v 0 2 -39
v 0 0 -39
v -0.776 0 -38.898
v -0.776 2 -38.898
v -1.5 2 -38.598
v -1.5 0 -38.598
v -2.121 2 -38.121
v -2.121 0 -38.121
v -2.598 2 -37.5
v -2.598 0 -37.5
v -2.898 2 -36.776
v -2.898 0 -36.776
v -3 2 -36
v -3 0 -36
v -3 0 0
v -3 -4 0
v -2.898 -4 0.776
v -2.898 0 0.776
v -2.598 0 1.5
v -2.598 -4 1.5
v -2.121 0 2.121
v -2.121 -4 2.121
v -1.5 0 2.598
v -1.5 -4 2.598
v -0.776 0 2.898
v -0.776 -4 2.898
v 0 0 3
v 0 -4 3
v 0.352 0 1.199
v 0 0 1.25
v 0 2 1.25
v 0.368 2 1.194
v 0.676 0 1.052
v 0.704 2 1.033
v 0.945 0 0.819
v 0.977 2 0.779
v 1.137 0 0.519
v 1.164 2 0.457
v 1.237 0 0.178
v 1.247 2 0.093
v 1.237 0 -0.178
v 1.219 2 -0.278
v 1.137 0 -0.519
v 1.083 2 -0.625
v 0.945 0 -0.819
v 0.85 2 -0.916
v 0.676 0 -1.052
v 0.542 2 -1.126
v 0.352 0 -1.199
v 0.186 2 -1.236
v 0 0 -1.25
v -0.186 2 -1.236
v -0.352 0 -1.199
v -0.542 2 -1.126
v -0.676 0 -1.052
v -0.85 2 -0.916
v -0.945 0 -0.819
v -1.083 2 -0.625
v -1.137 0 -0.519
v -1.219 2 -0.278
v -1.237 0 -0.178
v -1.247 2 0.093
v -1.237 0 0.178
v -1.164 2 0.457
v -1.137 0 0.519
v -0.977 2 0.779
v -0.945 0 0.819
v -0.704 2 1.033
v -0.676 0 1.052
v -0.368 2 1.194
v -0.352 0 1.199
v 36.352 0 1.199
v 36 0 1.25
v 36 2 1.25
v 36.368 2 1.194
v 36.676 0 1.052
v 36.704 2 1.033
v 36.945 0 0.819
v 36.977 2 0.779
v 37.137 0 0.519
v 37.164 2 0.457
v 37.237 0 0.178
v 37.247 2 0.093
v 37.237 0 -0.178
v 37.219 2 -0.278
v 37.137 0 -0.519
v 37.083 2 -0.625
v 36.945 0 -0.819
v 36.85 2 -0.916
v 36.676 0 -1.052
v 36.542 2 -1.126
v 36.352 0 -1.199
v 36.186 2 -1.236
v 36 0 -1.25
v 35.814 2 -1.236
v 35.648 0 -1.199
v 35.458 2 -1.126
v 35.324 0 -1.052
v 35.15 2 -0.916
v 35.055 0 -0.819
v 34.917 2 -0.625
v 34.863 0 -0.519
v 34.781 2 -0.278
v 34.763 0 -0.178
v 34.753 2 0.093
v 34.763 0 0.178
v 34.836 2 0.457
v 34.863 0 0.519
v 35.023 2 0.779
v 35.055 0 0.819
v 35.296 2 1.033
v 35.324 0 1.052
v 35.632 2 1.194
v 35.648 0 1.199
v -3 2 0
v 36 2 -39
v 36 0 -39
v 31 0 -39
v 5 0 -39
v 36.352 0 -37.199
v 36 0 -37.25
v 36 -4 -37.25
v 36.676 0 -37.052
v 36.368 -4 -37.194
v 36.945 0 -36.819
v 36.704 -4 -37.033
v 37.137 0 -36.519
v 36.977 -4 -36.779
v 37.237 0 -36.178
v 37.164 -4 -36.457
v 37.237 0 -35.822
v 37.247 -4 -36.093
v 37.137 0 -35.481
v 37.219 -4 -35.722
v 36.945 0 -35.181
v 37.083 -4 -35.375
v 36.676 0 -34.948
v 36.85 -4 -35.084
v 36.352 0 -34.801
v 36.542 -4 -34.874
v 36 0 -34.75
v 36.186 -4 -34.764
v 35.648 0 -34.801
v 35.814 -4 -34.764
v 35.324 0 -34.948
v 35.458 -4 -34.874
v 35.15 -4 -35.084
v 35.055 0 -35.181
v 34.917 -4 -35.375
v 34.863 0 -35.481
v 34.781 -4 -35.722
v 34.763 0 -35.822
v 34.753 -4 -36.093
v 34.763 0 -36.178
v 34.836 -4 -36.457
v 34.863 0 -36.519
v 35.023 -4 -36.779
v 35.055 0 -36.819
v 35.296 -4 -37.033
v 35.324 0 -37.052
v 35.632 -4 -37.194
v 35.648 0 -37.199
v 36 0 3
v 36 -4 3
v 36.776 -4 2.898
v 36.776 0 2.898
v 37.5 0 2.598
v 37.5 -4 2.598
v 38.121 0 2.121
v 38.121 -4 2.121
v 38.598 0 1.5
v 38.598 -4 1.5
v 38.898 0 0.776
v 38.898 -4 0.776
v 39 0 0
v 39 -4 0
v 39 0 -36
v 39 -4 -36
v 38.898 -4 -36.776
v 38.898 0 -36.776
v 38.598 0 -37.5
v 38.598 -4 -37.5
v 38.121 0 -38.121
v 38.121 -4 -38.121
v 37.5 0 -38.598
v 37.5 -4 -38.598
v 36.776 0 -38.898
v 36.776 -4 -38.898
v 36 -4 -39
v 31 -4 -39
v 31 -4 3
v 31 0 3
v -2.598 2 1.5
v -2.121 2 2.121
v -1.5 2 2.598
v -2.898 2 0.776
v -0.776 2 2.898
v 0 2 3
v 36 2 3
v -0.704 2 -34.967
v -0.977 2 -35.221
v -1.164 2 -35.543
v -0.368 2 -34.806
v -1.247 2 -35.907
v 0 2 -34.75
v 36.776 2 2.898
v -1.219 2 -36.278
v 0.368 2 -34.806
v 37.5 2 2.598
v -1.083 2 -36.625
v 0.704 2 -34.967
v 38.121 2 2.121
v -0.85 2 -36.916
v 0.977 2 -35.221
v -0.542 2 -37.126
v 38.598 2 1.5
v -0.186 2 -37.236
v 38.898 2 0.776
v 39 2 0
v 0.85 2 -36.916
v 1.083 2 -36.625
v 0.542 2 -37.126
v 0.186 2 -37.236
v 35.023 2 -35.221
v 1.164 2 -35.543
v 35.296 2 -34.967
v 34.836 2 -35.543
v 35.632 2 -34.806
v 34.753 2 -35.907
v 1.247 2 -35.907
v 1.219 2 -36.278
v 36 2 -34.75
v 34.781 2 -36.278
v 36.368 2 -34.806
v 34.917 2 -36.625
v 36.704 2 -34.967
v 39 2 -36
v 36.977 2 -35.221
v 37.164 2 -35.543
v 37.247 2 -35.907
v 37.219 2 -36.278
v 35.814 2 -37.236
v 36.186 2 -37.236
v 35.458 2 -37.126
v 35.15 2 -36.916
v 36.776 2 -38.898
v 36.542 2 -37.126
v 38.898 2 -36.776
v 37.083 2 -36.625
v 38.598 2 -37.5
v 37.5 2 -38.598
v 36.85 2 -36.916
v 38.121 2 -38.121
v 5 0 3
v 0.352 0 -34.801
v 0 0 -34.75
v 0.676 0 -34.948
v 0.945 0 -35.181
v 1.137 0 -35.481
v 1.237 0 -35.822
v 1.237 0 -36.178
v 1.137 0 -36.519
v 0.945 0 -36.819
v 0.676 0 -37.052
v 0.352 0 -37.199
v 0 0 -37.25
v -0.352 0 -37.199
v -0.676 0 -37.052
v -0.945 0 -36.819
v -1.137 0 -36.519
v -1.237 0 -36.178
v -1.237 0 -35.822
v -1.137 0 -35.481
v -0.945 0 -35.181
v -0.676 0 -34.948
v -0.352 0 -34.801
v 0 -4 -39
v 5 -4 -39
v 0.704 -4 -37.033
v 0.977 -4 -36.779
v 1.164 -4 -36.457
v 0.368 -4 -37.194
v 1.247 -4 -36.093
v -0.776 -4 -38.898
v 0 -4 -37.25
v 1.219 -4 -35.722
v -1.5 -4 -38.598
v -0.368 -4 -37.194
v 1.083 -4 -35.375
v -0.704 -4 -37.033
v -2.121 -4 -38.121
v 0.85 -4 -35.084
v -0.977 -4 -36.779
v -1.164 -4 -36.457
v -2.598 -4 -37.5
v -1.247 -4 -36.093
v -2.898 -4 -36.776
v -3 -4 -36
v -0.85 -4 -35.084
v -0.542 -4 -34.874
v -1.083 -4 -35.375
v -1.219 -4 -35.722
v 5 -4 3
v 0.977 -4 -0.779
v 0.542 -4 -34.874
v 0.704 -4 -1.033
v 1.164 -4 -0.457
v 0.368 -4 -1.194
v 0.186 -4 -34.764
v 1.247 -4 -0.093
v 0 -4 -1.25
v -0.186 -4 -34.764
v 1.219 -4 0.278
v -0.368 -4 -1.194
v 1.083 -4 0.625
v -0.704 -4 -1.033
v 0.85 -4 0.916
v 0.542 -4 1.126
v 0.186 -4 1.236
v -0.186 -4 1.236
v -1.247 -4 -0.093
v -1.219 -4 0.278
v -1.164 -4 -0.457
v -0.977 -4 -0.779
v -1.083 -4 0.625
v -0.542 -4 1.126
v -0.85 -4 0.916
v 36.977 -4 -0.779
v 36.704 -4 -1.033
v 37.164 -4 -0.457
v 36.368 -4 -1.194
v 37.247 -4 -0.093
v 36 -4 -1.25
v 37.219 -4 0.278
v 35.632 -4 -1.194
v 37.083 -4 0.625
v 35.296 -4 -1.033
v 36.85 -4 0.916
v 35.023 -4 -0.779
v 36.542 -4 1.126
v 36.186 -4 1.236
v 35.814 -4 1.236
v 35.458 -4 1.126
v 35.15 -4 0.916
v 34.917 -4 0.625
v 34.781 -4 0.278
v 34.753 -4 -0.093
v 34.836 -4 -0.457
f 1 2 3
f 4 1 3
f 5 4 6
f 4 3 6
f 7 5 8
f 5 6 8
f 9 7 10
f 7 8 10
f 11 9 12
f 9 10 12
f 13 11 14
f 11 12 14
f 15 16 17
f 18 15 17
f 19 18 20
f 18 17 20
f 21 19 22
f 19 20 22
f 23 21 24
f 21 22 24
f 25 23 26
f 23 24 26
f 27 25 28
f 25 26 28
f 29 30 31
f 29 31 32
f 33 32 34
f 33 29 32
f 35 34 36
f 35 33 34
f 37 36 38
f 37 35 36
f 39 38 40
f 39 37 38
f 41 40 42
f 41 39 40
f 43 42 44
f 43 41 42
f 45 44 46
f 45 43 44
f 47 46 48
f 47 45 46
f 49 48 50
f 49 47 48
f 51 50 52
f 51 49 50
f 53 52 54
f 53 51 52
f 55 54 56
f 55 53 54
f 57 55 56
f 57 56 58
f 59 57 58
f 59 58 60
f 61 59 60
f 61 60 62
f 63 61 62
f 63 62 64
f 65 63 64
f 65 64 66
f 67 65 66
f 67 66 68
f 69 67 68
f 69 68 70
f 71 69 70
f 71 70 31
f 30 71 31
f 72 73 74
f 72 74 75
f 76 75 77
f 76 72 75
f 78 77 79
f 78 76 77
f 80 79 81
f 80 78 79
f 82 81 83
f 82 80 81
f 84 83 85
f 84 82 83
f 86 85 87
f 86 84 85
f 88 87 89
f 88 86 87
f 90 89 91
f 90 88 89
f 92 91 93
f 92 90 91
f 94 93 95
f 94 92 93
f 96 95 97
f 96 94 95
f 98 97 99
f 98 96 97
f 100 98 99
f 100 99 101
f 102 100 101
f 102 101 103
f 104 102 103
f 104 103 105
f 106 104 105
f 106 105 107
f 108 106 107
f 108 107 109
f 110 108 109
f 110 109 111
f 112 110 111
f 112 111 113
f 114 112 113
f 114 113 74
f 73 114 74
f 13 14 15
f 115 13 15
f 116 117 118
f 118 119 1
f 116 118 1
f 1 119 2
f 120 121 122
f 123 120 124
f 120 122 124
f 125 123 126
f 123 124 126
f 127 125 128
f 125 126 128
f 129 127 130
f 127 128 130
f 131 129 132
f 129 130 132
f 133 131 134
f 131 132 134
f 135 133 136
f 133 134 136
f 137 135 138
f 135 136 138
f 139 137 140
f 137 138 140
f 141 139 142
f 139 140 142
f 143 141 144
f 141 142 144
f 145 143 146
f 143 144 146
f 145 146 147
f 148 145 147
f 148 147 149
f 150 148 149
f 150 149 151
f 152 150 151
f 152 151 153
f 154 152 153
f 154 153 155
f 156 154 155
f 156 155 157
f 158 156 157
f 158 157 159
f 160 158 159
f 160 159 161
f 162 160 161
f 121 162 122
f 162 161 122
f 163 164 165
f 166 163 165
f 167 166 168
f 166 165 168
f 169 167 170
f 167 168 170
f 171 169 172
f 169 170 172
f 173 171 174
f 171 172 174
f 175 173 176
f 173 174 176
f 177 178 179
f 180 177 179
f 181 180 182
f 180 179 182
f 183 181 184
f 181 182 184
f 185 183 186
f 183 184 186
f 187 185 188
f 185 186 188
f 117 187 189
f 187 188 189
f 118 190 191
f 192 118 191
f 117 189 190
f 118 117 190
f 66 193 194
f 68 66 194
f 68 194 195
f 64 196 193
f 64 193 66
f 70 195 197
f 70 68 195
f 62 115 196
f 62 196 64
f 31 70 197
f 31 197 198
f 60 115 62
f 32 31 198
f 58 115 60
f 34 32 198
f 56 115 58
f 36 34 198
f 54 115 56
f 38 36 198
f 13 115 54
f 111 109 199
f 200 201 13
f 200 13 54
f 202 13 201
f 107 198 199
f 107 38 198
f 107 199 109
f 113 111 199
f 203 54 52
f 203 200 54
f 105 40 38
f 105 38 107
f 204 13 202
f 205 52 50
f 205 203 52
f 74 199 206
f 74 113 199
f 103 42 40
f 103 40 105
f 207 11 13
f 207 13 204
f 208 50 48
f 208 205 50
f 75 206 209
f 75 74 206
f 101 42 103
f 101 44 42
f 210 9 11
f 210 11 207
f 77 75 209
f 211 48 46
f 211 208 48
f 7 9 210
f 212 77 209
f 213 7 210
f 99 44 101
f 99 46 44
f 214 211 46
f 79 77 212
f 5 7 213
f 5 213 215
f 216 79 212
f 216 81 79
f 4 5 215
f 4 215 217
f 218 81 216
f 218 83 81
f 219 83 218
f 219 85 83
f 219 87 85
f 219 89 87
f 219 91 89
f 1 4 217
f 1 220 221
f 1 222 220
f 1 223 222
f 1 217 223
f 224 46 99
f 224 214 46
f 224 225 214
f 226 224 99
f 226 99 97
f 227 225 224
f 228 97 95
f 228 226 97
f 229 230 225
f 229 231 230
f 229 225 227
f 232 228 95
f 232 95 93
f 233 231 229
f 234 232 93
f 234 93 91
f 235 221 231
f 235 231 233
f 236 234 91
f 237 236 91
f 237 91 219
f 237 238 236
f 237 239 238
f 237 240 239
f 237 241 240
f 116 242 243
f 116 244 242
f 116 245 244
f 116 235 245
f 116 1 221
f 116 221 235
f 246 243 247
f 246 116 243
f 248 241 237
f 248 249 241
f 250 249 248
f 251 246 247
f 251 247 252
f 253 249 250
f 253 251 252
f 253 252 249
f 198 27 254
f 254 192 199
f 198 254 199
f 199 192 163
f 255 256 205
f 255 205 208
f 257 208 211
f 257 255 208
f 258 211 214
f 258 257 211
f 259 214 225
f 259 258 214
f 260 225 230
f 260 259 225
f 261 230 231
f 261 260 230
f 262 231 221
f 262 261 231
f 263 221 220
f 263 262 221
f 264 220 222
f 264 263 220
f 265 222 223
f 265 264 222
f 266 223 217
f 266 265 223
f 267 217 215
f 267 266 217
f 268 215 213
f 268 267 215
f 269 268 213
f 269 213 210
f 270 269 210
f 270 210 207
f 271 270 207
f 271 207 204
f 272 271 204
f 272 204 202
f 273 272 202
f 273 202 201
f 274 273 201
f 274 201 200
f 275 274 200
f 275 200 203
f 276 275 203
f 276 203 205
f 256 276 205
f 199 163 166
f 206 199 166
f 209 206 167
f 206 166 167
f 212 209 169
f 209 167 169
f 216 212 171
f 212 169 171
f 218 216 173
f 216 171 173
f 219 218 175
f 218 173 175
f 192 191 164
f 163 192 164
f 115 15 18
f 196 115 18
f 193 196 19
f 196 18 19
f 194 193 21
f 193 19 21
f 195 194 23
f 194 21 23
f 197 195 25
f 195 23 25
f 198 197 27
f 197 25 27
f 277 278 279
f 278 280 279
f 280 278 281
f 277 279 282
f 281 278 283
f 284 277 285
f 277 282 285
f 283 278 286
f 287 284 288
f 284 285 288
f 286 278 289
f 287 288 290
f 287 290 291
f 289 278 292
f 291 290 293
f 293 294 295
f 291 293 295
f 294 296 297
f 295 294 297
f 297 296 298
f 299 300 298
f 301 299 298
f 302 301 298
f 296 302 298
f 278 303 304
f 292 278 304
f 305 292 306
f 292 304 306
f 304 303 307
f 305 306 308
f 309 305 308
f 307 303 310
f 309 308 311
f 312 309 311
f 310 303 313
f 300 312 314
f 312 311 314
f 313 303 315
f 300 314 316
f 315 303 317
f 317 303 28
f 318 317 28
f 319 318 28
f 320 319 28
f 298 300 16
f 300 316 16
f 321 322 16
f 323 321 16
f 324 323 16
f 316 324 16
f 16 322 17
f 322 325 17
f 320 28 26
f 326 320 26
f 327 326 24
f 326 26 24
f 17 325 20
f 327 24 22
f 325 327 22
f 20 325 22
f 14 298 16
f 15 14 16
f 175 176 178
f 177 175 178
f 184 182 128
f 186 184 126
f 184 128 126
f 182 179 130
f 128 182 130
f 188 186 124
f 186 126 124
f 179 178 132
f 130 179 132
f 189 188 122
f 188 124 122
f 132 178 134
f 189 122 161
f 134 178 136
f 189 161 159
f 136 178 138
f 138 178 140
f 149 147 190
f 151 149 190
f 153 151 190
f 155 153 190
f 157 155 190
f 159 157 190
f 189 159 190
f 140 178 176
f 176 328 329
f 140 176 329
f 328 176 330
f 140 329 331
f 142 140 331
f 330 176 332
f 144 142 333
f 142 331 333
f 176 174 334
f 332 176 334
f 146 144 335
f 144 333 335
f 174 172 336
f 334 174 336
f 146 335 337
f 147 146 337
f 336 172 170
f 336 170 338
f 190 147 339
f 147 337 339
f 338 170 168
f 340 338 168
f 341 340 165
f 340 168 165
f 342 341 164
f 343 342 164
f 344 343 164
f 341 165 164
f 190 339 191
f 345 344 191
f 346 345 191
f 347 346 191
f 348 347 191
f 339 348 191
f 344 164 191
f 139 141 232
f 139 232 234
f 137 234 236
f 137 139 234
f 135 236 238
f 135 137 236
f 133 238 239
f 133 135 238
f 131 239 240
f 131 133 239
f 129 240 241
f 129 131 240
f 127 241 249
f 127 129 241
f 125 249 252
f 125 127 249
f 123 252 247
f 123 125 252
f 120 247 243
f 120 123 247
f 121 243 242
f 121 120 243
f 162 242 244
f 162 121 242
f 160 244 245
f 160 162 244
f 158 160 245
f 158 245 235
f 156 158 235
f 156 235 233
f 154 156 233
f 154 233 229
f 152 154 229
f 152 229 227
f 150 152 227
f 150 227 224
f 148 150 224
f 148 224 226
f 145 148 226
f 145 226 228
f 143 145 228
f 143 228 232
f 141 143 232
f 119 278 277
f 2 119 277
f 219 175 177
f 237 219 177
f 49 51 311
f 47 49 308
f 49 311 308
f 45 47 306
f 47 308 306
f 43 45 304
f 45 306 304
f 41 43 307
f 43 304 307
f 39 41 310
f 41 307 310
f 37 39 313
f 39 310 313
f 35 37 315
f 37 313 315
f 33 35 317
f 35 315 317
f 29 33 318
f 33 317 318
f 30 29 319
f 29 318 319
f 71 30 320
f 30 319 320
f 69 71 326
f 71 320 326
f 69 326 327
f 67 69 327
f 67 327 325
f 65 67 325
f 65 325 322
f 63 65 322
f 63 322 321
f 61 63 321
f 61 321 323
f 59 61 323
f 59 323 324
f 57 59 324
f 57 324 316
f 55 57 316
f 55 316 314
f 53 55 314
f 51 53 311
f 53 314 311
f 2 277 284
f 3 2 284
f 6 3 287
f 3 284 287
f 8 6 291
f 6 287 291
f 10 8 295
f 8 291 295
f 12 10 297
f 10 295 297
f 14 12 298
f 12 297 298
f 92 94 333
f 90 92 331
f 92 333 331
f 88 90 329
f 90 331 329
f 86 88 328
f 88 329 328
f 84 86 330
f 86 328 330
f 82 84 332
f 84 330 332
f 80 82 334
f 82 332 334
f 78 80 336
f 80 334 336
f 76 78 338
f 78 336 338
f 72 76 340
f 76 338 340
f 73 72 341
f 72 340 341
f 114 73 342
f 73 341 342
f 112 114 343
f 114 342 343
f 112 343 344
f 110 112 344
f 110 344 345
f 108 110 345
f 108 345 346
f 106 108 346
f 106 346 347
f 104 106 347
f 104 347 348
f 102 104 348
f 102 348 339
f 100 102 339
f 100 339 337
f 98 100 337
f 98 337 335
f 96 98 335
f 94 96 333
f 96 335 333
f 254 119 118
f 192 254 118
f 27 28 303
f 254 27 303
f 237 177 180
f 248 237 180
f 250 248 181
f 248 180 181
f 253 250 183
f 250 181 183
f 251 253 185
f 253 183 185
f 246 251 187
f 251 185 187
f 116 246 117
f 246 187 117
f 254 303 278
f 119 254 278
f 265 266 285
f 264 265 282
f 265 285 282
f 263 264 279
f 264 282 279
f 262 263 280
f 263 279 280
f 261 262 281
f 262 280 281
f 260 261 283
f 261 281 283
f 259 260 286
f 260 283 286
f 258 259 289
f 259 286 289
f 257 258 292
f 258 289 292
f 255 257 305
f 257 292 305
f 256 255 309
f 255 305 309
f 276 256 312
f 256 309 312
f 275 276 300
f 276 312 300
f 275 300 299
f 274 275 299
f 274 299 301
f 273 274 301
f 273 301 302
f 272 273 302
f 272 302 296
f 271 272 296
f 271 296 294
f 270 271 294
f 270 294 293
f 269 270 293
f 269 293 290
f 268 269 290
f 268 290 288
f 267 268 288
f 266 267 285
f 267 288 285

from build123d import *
from build123d.topology import SkipClean

# Parameters (mm, degrees)
SKETCH_1_R      = 1.25
EXTRUDE_1_DEPTH = 2
EXTRUDE_START   = 4
SKETCH_2_R      = 1.25
EXTRUDE_2_DEPTH = 4


with BuildPart() as part:
    # 草图1 → 凸台-拉伸1 (new body)
    with BuildSketch(Plane(origin=(0, 0, 0), x_dir=(1, 0, 0), z_dir=(0, 1, 0))):
        with BuildLine():
            Line((0, -3), (36, -3))
            ThreePointArc((36, -3), (38.121320344, -2.121320344), (39, 0))
            Line((39, 0), (39, 36))
            ThreePointArc((39, 36), (38.121320344, 38.121320344), (36, 39))
            Line((36, 39), (0, 39))
            ThreePointArc((0, 39), (-2.121320344, 38.121320344), (-3, 36))
            Line((-3, 36), (-3, 0))
            ThreePointArc((-3, 0), (-2.121320344, -2.121320344), (0, -3))
        make_face()
        with Locations(Location((0, 36, 0), (0, 0, 270))):
            Circle(SKETCH_1_R, mode=Mode.SUBTRACT)
        with Locations(Location((36, 36, 0), (0, 0, 270))):
            Circle(SKETCH_1_R, mode=Mode.SUBTRACT)
        with Locations(Location((0, 0, 0), (0, 0, 270))):
            Circle(SKETCH_1_R, mode=Mode.SUBTRACT)
        with Locations(Location((36, 0, 0), (0, 0, 270))):
            Circle(SKETCH_1_R, mode=Mode.SUBTRACT)
    extrude(amount=EXTRUDE_1_DEPTH)

    # 草图2 → 凸台-拉伸2 (add)
    # profile 1 of 2: a face of its own
    with SkipClean():  # the faces are left unmerged after this step: merging them gives an invalid solid
        with BuildSketch(Plane.XZ.offset(EXTRUDE_START)):
            with BuildLine():
                Line((39, 0), (39, -36))
                ThreePointArc((39, -36), (38.121320344, -38.121320344), (36, -39))
                Line((36, -39), (31, -39))
                Line((31, -39), (31, 3))
                Line((31, 3), (36, 3))
                ThreePointArc((36, 3), (38.121320344, 2.121320344), (39, 0))
            make_face()
            with Locations(Location((36, -36, 0), (0, 0, 270))):
                Circle(SKETCH_2_R, mode=Mode.SUBTRACT)
            with Locations(Location((36, 0, 0), (0, 0, 270))):
                Circle(SKETCH_2_R, mode=Mode.SUBTRACT)
        # profile 2 of 2: a face of its own
        with BuildSketch(Plane.XZ.offset(EXTRUDE_START)):
            with BuildLine():
                Line((-3, -36), (-3, 0))
                ThreePointArc((-3, 0), (-2.121320344, 2.121320344), (0, 3))
                Line((0, 3), (5, 3))
                Line((5, 3), (5, -39))
                Line((5, -39), (0, -39))
                ThreePointArc((0, -39), (-2.121320344, -38.121320344), (-3, -36))
            make_face()
            with Locations(Location((0, -36, 0), (0, 0, 270))):
                Circle(SKETCH_2_R, mode=Mode.SUBTRACT)
            with Locations(Location((0, 0, 0), (0, 0, 270))):
                Circle(SKETCH_2_R, mode=Mode.SUBTRACT)
        extrude(amount=-EXTRUDE_2_DEPTH)


solid = part.part
